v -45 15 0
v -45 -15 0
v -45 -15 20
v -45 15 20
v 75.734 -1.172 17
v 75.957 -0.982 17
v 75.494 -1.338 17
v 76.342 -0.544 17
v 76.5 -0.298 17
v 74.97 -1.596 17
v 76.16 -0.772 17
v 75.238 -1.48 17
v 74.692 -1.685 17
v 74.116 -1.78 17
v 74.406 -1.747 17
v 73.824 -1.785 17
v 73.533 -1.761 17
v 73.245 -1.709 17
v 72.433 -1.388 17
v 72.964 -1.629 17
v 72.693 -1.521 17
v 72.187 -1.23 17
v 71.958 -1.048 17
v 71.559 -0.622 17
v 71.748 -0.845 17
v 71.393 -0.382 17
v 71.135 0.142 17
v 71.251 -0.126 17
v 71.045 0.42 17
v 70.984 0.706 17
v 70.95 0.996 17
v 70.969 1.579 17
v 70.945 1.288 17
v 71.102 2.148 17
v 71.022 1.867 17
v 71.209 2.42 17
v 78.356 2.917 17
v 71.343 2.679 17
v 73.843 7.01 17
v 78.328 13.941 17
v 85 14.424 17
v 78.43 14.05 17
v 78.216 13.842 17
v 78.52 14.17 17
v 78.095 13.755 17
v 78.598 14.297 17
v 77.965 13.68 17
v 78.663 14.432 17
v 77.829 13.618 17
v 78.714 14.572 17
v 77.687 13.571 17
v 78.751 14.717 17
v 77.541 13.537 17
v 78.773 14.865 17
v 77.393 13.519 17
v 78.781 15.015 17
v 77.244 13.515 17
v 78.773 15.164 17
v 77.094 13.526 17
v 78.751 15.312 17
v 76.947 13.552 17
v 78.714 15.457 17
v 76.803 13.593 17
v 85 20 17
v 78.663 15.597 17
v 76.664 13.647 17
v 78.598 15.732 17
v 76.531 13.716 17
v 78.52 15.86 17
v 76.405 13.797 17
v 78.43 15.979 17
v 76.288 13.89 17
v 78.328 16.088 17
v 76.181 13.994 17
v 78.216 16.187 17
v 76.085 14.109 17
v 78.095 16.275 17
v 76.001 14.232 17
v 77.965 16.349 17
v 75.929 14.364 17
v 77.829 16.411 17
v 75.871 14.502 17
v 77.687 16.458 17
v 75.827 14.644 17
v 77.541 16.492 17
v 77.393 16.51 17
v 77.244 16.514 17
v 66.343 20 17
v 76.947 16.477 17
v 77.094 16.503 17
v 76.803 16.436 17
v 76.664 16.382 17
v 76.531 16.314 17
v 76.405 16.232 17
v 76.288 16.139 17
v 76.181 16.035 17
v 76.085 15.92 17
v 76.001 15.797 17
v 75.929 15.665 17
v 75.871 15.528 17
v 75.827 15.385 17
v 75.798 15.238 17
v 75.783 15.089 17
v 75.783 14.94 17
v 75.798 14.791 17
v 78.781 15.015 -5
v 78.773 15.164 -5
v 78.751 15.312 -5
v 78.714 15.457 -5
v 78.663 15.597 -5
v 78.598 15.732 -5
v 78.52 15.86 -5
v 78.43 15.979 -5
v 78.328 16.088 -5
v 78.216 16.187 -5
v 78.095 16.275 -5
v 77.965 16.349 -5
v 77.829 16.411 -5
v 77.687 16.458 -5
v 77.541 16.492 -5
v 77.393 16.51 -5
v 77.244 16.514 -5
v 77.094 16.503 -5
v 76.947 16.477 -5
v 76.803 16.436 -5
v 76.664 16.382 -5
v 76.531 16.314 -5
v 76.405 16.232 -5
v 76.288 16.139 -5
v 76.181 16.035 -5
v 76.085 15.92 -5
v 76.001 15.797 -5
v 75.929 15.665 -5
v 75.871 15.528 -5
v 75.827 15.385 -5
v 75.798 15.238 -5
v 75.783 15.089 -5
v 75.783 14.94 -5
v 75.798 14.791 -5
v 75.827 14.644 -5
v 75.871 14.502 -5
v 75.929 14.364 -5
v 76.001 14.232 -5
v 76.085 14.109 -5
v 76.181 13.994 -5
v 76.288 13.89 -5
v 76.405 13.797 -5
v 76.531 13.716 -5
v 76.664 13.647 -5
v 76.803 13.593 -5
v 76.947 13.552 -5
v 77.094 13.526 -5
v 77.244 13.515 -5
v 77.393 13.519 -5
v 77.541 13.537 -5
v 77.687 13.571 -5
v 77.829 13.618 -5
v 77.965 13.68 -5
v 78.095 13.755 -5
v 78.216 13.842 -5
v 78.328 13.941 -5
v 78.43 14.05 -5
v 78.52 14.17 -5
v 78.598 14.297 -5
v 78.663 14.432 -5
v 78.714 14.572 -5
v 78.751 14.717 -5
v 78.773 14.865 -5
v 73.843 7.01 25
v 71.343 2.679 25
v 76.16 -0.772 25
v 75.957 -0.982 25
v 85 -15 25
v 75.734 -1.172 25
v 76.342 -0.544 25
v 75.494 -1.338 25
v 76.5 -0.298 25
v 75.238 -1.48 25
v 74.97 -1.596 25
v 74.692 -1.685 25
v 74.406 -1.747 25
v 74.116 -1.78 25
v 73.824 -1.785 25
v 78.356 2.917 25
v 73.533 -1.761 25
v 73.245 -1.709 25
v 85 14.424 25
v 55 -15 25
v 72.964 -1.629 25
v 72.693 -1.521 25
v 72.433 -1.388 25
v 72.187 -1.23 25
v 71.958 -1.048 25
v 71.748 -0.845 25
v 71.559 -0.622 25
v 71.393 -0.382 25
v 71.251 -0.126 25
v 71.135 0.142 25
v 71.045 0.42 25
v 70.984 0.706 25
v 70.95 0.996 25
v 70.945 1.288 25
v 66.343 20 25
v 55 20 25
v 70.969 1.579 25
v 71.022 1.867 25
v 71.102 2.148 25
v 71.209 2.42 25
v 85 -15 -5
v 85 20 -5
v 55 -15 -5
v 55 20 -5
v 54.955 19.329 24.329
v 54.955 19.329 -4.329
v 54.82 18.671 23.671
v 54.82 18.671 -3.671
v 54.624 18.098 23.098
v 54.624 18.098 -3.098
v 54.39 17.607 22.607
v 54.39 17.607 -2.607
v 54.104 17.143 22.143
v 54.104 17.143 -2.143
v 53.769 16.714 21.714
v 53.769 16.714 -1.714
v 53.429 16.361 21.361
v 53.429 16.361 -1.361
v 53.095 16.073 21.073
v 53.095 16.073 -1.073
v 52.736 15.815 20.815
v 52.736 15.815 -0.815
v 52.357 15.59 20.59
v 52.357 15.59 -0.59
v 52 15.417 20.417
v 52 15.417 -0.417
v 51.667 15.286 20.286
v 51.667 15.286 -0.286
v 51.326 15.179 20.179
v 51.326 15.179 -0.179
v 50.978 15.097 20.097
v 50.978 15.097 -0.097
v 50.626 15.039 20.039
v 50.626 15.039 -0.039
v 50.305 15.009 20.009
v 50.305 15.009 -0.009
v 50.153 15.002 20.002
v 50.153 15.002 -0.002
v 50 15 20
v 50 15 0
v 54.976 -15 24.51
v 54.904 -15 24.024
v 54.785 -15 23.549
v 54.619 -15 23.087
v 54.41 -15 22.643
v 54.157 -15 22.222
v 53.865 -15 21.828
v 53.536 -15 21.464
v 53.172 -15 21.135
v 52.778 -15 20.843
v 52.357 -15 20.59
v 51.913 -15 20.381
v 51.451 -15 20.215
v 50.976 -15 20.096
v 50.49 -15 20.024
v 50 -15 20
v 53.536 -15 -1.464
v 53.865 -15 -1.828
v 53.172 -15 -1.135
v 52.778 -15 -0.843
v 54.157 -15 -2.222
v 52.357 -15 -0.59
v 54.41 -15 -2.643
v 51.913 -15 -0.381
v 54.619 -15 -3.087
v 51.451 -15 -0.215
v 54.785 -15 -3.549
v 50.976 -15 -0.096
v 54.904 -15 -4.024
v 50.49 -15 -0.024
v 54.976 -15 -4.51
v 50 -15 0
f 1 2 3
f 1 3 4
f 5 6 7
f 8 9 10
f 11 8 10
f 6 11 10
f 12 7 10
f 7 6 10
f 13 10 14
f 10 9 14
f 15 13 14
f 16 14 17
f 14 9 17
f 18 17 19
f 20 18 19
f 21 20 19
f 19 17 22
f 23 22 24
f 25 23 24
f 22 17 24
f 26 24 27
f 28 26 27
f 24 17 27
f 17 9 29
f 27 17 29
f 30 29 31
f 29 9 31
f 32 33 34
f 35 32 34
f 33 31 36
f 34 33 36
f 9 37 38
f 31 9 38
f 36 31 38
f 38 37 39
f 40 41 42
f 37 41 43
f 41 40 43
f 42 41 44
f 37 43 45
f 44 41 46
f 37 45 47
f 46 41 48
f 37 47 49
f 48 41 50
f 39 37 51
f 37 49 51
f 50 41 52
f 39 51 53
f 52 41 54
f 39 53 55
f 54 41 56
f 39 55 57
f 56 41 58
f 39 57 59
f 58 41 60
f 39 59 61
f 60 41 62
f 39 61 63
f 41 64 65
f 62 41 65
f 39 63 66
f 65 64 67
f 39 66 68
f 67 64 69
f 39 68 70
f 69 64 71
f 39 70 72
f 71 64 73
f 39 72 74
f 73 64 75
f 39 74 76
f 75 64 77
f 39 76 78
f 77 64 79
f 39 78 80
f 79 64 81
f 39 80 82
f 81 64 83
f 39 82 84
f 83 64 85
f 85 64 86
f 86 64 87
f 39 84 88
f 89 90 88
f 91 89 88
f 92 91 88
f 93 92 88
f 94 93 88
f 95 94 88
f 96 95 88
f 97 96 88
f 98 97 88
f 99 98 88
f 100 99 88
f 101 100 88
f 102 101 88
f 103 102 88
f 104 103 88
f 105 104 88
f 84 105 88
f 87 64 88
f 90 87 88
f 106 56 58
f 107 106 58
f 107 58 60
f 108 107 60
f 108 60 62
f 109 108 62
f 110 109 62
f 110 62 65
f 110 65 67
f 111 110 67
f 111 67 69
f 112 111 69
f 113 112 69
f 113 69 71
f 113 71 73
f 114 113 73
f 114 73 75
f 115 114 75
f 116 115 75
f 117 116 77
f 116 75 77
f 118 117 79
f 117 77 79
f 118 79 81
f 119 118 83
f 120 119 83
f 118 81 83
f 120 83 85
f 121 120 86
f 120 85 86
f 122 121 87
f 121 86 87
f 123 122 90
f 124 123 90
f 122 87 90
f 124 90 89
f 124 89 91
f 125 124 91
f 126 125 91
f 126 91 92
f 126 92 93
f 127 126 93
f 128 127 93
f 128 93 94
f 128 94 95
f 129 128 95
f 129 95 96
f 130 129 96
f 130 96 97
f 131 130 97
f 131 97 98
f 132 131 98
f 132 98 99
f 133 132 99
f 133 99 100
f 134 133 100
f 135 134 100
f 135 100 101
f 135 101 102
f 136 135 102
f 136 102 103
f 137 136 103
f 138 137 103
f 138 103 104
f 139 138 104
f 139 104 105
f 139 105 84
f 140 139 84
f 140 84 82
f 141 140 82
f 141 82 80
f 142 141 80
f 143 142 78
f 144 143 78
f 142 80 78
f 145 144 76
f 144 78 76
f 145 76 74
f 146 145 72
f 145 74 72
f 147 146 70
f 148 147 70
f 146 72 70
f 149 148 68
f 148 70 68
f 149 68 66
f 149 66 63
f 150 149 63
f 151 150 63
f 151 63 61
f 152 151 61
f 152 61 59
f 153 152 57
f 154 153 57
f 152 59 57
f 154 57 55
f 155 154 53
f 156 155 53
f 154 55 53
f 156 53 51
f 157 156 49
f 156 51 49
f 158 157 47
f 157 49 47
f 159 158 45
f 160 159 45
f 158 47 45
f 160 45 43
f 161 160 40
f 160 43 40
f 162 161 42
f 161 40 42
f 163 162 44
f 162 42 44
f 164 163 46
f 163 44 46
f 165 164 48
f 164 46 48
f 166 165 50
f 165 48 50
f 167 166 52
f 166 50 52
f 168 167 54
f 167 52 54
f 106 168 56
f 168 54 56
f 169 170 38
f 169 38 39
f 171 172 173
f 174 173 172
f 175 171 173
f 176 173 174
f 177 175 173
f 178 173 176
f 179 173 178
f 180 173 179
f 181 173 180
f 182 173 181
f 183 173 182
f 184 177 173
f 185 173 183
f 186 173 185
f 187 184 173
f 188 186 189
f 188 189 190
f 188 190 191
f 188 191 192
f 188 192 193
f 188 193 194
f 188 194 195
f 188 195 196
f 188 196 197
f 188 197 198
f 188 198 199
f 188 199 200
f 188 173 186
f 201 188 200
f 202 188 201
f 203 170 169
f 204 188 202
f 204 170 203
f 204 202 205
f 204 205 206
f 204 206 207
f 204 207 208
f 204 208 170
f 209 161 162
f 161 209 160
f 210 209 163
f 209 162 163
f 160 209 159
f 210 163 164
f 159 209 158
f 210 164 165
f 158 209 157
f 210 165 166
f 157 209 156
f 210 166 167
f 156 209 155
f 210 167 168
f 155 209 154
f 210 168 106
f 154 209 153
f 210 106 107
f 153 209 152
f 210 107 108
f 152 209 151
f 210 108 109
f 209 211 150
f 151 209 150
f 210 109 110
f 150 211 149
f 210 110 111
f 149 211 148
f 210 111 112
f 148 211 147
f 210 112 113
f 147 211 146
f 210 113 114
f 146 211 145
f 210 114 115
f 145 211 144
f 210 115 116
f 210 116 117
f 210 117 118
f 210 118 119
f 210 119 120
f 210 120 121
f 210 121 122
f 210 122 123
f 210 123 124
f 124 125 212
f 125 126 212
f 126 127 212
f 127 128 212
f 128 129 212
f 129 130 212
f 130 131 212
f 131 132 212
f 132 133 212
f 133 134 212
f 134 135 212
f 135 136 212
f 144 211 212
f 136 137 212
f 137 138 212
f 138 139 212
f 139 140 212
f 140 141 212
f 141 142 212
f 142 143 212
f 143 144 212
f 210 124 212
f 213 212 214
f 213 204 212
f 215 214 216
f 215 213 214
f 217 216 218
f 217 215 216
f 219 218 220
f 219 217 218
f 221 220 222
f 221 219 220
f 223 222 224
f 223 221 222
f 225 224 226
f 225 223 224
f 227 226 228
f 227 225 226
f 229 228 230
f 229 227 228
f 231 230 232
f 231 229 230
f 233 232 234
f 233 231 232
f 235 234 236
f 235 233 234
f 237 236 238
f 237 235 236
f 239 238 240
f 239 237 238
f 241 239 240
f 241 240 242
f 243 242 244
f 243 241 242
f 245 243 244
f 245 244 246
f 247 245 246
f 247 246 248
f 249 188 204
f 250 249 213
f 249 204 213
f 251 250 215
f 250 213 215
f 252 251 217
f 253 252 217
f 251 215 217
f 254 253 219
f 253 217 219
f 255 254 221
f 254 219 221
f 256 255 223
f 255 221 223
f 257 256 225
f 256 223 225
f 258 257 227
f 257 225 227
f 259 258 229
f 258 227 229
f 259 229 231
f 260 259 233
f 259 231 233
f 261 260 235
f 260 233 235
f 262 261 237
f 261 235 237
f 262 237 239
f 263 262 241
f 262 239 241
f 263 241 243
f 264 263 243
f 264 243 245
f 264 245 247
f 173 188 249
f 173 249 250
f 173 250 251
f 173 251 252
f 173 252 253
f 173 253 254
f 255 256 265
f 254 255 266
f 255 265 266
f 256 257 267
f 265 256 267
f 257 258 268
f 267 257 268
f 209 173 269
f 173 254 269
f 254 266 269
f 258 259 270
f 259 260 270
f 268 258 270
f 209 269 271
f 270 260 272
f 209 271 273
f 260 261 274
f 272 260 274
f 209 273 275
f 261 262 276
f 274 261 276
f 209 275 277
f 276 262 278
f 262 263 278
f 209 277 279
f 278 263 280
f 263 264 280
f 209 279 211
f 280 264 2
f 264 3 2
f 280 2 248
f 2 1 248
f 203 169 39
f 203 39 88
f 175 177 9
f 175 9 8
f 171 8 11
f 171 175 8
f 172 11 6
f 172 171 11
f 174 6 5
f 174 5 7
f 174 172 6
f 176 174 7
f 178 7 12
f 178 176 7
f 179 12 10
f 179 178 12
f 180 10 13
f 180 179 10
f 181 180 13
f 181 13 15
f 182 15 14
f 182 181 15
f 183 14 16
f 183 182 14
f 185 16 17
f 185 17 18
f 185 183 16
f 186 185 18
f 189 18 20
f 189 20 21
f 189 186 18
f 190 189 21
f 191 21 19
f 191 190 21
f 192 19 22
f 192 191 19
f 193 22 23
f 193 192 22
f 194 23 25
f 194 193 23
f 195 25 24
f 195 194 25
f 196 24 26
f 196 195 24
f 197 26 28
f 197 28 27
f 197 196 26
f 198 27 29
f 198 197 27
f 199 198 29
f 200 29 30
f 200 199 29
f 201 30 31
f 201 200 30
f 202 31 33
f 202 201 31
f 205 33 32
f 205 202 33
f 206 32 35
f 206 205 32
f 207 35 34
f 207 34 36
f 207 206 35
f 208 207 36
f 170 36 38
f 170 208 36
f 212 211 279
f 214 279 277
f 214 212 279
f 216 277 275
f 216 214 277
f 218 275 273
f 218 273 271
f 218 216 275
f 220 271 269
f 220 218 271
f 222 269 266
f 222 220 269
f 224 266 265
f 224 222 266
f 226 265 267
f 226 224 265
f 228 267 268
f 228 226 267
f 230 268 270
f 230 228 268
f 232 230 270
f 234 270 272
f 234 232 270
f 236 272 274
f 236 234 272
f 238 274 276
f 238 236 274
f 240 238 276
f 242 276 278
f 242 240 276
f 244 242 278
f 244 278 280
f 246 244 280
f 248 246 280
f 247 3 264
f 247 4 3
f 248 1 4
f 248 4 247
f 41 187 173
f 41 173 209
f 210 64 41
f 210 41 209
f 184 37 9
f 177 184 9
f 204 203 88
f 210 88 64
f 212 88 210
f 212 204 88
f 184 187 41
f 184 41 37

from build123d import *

# Parameters (mm, degrees)
SKETCH_1_W          = 100
SKETCH_1_H          = 30
EXTRUDE_1_DEPTH     = 20
SKETCH_2_W          = 30
SKETCH_2_H          = 35
EXTRUDE_2_DEPTH     = 30
FILLET_1_R          = 5
CUT_EXTRUDE_1_DEPTH = 8
SKETCH_4_R          = 1.5
CUT_EXTRUDE_2_DEPTH = 91.049986119


with BuildPart() as part:
    # 草图1 → 凸台-拉伸1 (new body)
    with BuildSketch(Plane.XY):
        with Locations((5, 0)):
            Rectangle(SKETCH_1_W, SKETCH_1_H)
    extrude(amount=EXTRUDE_1_DEPTH)

    # 草图2 → 凸台-拉伸2 (add)
    with BuildSketch(Plane(origin=(55, 0, 0), x_dir=(0, 0, -1), z_dir=(1, 0, 0))):
        with Locations((-10, 2.5)):
            Rectangle(SKETCH_2_W, SKETCH_2_H)
    extrude(amount=EXTRUDE_2_DEPTH)

    # 圆角1
    fillet_1_edges = [part.edges().sort_by_distance(p)[0] for p in [
        (55, 0, 0),
        (55, 15, 10),
        (55, 0, 20),
    ]]
    fillet(fillet_1_edges, radius=FILLET_1_R - 0.0001)  # a hair under: the kernel refuses the full size

    # 草图3 → 切除-拉伸1 (cut)
    with BuildSketch(Plane.XY.offset(25)):
        with BuildLine():
            Line((73.842770799, 7.009618943), (66.342770799, 20))
            Line((66.342770799, 20), (85, 20))
            Line((85, 20), (85, 14.424396121))
            Line((85, 14.424396121), (78.356092757, 2.916811216))
            Line((78.356092757, 2.916811216), (76.5, -0.298035743))
            ThreePointArc((76.5, -0.298035743), (72.432621566, -1.38788651), (71.342770799, 2.679491924))
            Line((71.342770799, 2.679491924), (73.842770799, 7.009618943))
        make_face()
    extrude(amount=-CUT_EXTRUDE_1_DEPTH, mode=Mode.SUBTRACT)

    # 草图4 → 切除-拉伸2 (cut, through all)
    with BuildSketch(Plane.XY.offset(17)):
        with Locations((77.2809236, 15.014563609)):
            Circle(SKETCH_4_R)
    extrude(amount=-CUT_EXTRUDE_2_DEPTH, mode=Mode.SUBTRACT)


solid = part.part
